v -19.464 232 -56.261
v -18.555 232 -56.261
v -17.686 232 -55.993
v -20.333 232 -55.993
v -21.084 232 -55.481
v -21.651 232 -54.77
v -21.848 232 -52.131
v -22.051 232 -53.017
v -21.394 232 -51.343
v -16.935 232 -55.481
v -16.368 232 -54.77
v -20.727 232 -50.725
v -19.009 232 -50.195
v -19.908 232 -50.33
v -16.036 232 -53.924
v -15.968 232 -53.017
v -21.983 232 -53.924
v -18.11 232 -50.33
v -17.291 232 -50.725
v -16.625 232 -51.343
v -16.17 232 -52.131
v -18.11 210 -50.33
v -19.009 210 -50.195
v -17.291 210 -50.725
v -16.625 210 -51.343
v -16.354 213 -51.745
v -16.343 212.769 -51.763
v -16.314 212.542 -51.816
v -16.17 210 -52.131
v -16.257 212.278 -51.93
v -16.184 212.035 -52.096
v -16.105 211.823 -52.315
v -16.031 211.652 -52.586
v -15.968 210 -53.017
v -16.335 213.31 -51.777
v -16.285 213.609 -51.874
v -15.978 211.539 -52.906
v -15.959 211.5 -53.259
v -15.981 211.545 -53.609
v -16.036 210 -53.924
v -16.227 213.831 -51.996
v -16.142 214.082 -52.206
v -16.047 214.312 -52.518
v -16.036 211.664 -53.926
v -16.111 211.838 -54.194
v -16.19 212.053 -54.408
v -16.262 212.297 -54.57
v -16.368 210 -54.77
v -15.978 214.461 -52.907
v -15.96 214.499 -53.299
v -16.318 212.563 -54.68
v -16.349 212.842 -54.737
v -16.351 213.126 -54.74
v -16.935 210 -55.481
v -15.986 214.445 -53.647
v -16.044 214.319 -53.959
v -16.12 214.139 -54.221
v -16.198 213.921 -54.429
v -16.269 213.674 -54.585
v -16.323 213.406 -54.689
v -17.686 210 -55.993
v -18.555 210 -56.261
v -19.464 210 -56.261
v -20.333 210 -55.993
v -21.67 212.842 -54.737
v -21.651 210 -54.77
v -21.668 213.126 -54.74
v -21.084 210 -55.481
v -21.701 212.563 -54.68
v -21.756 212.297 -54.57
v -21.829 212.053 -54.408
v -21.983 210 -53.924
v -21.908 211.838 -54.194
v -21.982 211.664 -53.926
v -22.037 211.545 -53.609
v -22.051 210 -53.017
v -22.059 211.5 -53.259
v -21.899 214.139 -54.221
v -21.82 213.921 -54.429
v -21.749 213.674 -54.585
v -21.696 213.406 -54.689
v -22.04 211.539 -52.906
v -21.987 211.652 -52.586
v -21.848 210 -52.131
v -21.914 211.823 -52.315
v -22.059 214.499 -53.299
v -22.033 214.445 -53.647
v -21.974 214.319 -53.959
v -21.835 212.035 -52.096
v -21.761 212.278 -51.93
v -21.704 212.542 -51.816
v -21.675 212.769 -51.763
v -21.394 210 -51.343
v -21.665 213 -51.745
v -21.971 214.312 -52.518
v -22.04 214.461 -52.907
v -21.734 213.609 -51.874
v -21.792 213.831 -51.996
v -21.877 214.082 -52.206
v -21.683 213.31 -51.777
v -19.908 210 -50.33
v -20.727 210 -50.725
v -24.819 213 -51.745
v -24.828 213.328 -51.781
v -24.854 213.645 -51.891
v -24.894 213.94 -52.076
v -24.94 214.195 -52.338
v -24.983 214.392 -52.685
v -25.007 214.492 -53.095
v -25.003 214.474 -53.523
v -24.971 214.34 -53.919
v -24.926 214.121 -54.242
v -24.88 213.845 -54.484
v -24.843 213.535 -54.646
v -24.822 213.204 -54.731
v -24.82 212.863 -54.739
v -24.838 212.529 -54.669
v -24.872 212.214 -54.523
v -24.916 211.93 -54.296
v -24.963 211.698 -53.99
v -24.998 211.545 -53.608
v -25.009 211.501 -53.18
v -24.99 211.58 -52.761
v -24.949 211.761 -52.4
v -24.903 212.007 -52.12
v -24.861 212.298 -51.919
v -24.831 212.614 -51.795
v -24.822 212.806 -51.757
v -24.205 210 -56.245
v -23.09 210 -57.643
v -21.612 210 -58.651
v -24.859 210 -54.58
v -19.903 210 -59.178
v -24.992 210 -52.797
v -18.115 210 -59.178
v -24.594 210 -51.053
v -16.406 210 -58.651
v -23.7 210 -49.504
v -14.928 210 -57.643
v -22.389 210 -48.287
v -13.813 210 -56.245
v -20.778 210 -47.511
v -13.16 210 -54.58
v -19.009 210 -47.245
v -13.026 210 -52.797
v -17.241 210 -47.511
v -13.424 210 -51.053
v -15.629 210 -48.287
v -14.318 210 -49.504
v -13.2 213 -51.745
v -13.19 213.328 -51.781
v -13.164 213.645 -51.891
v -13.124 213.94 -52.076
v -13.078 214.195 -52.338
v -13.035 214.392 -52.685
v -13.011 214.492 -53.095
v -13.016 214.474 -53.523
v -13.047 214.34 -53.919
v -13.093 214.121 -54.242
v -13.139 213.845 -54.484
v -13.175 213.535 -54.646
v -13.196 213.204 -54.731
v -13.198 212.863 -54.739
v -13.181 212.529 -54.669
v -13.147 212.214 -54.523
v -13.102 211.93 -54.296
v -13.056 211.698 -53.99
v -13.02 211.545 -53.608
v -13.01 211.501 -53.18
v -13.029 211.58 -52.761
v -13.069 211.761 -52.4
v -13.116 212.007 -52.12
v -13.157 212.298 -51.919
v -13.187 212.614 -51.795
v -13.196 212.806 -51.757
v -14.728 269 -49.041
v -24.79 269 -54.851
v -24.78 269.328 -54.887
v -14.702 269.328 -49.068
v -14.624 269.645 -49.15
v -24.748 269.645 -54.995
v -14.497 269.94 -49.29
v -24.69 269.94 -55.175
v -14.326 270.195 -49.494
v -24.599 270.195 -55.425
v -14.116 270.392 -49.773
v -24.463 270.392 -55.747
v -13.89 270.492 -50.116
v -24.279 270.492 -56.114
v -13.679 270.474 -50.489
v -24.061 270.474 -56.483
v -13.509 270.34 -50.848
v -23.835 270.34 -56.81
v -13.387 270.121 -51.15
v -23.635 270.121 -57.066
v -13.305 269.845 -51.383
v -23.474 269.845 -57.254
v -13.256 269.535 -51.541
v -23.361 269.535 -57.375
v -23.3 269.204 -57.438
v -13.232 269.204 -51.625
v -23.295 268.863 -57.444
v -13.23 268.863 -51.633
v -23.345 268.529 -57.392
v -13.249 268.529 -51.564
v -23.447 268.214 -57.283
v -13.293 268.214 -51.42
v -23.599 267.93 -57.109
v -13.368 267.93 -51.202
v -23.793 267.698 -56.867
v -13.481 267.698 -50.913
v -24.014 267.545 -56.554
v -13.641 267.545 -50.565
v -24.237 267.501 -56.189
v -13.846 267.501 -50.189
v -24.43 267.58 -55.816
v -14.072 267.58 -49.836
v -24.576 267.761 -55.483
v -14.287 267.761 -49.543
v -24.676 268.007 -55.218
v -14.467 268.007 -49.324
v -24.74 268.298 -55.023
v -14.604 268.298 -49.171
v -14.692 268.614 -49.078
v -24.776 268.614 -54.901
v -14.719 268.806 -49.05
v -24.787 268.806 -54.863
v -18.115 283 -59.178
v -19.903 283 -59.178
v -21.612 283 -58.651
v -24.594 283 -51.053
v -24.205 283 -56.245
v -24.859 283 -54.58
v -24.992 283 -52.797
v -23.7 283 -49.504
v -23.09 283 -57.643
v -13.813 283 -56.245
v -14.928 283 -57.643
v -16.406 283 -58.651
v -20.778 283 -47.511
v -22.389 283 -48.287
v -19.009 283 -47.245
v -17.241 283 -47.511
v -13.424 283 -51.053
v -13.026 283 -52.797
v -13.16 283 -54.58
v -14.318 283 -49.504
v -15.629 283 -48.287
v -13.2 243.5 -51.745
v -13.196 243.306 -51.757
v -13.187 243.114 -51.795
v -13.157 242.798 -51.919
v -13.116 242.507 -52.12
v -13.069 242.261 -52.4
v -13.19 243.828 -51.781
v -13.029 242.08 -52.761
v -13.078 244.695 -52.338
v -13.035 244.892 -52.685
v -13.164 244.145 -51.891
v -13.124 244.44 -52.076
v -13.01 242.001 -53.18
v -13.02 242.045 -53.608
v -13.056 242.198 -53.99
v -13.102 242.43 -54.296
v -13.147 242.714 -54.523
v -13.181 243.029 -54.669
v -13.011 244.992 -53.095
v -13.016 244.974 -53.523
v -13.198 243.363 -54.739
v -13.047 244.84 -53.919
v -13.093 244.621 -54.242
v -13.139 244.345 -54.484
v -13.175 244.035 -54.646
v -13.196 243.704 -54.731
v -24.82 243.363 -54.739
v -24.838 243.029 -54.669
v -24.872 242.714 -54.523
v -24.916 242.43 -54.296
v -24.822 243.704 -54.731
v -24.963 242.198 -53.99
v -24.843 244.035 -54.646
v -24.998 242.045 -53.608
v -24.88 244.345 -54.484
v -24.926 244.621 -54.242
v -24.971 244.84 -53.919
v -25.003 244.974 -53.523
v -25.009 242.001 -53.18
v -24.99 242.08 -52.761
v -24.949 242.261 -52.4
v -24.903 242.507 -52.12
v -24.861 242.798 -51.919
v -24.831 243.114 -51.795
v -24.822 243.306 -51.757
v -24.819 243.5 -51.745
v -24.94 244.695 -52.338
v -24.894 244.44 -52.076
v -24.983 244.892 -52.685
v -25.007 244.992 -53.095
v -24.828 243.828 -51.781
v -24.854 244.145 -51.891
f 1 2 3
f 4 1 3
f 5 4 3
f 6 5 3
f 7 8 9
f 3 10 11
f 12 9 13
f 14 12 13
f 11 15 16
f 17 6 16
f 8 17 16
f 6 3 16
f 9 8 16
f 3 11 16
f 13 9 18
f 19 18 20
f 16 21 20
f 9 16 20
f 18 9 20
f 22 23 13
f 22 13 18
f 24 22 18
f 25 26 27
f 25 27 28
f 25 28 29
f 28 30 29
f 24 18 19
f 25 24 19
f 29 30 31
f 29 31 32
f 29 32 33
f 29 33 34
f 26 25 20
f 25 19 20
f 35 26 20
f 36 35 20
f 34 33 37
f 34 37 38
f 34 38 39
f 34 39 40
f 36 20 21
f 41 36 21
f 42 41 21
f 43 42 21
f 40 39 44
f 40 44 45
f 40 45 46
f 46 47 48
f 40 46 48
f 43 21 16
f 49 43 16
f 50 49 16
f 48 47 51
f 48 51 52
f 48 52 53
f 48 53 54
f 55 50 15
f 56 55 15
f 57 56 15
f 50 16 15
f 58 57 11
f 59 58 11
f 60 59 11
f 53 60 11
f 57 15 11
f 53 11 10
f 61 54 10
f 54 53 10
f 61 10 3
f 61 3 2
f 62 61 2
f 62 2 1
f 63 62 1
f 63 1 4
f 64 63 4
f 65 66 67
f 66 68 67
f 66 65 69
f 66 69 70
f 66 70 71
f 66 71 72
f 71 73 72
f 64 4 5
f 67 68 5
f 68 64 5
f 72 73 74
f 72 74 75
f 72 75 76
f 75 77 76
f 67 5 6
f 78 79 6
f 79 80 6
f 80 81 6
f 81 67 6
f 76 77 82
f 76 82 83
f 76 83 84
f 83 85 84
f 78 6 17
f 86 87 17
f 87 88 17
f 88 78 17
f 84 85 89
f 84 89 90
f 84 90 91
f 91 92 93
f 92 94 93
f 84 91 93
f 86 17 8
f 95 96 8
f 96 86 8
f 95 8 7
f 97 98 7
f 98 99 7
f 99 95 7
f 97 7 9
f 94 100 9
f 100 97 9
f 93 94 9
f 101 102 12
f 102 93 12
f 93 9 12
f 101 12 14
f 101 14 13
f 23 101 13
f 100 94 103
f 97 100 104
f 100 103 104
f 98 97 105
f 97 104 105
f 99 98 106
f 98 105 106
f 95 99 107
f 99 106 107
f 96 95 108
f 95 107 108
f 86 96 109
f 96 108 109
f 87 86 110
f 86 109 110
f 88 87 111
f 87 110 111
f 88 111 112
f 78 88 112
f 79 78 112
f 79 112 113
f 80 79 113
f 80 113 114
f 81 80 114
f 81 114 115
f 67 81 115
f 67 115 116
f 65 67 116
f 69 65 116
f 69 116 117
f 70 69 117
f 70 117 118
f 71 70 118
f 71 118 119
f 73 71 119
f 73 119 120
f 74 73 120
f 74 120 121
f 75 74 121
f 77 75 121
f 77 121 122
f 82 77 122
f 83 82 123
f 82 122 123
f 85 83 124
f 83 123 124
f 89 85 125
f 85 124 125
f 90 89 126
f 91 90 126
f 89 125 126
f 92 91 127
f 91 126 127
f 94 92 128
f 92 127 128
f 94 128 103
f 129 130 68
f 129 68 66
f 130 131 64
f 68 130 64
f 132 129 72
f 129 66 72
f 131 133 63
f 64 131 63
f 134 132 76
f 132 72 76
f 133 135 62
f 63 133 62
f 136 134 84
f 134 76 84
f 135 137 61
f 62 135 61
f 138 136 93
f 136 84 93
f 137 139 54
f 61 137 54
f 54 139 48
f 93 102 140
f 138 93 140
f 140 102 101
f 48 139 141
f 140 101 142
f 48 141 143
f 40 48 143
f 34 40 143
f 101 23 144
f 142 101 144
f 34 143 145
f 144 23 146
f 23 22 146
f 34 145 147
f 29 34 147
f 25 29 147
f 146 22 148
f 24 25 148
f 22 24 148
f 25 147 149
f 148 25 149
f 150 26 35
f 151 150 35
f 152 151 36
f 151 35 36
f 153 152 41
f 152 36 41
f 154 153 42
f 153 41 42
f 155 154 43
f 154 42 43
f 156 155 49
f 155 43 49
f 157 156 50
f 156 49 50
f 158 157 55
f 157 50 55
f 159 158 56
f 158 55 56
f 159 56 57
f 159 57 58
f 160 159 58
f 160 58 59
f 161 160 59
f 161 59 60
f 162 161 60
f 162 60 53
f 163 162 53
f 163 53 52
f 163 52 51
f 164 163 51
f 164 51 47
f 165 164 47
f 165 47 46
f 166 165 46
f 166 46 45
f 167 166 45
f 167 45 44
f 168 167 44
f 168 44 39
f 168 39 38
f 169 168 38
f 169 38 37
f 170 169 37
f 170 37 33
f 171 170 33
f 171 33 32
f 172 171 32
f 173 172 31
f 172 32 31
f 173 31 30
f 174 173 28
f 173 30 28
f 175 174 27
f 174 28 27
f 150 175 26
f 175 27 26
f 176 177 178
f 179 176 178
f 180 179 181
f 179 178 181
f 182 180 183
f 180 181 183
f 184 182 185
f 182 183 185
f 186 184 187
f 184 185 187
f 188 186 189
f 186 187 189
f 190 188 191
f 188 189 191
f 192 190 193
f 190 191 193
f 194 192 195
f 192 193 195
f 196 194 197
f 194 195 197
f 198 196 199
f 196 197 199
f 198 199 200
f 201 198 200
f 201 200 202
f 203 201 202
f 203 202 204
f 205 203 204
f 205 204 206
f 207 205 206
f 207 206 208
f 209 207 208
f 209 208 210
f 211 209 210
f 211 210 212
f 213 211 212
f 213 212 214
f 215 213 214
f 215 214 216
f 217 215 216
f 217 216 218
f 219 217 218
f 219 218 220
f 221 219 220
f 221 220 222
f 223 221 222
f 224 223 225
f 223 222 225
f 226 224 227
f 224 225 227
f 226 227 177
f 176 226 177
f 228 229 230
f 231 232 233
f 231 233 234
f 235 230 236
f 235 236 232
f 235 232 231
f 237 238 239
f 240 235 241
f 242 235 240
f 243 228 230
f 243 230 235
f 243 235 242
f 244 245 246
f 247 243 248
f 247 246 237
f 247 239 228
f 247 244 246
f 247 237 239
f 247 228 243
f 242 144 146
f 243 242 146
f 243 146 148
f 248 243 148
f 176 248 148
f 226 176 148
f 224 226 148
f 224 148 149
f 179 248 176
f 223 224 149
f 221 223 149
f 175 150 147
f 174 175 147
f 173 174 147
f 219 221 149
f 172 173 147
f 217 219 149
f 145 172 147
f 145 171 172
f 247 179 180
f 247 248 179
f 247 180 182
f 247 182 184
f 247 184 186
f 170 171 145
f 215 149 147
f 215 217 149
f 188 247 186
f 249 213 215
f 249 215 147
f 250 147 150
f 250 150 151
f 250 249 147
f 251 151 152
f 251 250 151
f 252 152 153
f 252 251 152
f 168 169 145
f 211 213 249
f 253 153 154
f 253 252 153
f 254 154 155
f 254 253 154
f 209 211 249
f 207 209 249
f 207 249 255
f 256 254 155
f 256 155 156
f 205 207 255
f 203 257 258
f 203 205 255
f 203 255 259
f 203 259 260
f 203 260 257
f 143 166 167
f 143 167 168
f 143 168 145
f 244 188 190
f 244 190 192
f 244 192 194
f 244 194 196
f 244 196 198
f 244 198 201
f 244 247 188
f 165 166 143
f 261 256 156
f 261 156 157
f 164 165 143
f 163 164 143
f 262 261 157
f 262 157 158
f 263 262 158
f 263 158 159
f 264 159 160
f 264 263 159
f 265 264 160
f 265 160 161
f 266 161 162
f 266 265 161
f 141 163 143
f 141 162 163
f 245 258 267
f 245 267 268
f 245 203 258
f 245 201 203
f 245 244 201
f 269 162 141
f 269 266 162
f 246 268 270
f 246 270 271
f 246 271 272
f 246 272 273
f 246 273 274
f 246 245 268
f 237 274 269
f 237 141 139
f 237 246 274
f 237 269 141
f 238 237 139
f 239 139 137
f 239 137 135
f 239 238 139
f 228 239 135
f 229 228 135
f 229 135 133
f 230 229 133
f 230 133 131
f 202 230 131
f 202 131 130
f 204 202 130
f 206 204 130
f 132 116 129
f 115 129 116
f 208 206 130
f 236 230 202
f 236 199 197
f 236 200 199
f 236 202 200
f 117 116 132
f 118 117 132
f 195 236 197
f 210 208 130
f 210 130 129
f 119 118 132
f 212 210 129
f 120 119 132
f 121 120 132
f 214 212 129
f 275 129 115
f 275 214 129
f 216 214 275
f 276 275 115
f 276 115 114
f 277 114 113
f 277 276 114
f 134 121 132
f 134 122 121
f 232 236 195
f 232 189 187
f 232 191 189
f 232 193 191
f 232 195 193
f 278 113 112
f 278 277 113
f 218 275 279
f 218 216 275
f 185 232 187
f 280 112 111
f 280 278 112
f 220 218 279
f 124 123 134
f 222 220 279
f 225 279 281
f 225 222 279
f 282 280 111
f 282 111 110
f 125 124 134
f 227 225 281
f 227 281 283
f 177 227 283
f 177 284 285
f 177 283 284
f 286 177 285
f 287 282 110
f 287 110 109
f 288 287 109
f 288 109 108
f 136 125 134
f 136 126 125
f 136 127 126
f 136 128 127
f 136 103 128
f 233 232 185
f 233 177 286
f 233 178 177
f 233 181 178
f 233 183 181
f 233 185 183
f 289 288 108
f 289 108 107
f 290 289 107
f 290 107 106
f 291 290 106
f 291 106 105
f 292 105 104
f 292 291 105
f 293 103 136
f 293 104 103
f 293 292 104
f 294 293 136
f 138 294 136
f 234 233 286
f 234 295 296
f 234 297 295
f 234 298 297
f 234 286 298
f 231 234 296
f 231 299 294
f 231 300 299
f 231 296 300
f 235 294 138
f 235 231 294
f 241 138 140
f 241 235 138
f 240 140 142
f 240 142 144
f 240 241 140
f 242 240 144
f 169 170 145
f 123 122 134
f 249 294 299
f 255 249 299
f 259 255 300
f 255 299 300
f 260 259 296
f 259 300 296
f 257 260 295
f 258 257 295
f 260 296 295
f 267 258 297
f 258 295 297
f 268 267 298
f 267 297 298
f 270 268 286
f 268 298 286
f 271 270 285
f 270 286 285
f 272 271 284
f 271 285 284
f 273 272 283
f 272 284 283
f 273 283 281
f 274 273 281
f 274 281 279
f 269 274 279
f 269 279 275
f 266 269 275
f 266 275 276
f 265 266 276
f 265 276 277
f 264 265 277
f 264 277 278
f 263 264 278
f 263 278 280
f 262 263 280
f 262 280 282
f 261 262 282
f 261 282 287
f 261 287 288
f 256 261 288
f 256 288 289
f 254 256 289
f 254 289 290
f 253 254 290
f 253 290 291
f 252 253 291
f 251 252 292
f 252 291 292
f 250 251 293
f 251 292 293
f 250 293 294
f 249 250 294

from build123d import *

# Parameters (mm, degrees)
TWELVE_MILLIMETRE_AXLE_STOCK_SKETCH_R = 6
TWELVE_MILLIMETRE_AXLE_STOCK_DEPTH    = 73
MOTOR_COUPLING_SOCKET_SKETCH_R        = 3.05
MOTOR_COUPLING_SOCKET_DEPTH           = 22.1
FRONT_COLLAR_PIN_SKETCH_R             = 1.5
FRONT_COLLAR_PIN_DEPTH                = 14
REAR_COLLAR_PIN_SKETCH_R              = 1.5
REAR_COLLAR_PIN_DEPTH                 = 14
HUB_DRIVE_PIN_SKETCH_R                = 1.5
HUB_DRIVE_PIN_DEPTH                   = 14


with BuildPart() as part:
    # Twelve millimetre axle stock sketch → Twelve millimetre axle stock (new body)
    with BuildSketch(Plane(origin=(0, -283, 0), x_dir=(1, 0, 0), z_dir=(0, 1, 0))):
        with Locations(Location((-19.009182883, 53.244882879, 0), (0, 0, 270))):
            Circle(TWELVE_MILLIMETRE_AXLE_STOCK_SKETCH_R)
    extrude(amount=TWELVE_MILLIMETRE_AXLE_STOCK_DEPTH)

    # Motor coupling socket sketch → Motor coupling socket (cut)
    with BuildSketch(Plane(origin=(0, -232, 0), x_dir=(1, 0, 0), z_dir=(0, 1, 0))):
        with Locations(Location((-19.009182883, 53.244882879, 0), (0, 0, 270))):
            Circle(MOTOR_COUPLING_SOCKET_SKETCH_R)
    extrude(amount=MOTOR_COUPLING_SOCKET_DEPTH, mode=Mode.SUBTRACT)

    # Front collar pin sketch → Front collar pin (cut)
    with BuildSketch(Plane(origin=(-26.009182883, 0, 0), x_dir=(0, 0, -1), z_dir=(1, 0, 0))):
        with Locations(Location((53.244882879, -213, 0), (0, 0, 180))):
            Circle(FRONT_COLLAR_PIN_SKETCH_R)
    extrude(amount=FRONT_COLLAR_PIN_DEPTH, mode=Mode.SUBTRACT)

    # Rear collar pin sketch → Rear collar pin (cut)
    with BuildSketch(Plane(origin=(-26.009182883, 0, 0), x_dir=(0, 0, -1), z_dir=(1, 0, 0))):
        with Locations(Location((53.244882879, -243.5, 0), (0, 0, 180))):
            Circle(REAR_COLLAR_PIN_SKETCH_R)
    extrude(amount=REAR_COLLAR_PIN_DEPTH, mode=Mode.SUBTRACT)

    # Hub drive pin sketch → Hub drive pin (cut)
    with BuildSketch(Plane(origin=(-43.374775586, 0, -25.042438361), x_dir=(0.5000000000000001, 0, -0.8660254037844386), z_dir=(0.8660254037844386, 0, 0.5000000000000001))):
        with Locations(Location((36.606829753, -269, 0), (0, 0, 180))):
            Circle(HUB_DRIVE_PIN_SKETCH_R)
    extrude(amount=HUB_DRIVE_PIN_DEPTH, mode=Mode.SUBTRACT)


with BuildPart() as body_2:
    # Mirror1: mirrored copy
    add(part.part.mirror(Plane(origin=(0, 0, 0), x_dir=(0, 0, 1), z_dir=(0, -1, 0))))


solid = body_2.part
